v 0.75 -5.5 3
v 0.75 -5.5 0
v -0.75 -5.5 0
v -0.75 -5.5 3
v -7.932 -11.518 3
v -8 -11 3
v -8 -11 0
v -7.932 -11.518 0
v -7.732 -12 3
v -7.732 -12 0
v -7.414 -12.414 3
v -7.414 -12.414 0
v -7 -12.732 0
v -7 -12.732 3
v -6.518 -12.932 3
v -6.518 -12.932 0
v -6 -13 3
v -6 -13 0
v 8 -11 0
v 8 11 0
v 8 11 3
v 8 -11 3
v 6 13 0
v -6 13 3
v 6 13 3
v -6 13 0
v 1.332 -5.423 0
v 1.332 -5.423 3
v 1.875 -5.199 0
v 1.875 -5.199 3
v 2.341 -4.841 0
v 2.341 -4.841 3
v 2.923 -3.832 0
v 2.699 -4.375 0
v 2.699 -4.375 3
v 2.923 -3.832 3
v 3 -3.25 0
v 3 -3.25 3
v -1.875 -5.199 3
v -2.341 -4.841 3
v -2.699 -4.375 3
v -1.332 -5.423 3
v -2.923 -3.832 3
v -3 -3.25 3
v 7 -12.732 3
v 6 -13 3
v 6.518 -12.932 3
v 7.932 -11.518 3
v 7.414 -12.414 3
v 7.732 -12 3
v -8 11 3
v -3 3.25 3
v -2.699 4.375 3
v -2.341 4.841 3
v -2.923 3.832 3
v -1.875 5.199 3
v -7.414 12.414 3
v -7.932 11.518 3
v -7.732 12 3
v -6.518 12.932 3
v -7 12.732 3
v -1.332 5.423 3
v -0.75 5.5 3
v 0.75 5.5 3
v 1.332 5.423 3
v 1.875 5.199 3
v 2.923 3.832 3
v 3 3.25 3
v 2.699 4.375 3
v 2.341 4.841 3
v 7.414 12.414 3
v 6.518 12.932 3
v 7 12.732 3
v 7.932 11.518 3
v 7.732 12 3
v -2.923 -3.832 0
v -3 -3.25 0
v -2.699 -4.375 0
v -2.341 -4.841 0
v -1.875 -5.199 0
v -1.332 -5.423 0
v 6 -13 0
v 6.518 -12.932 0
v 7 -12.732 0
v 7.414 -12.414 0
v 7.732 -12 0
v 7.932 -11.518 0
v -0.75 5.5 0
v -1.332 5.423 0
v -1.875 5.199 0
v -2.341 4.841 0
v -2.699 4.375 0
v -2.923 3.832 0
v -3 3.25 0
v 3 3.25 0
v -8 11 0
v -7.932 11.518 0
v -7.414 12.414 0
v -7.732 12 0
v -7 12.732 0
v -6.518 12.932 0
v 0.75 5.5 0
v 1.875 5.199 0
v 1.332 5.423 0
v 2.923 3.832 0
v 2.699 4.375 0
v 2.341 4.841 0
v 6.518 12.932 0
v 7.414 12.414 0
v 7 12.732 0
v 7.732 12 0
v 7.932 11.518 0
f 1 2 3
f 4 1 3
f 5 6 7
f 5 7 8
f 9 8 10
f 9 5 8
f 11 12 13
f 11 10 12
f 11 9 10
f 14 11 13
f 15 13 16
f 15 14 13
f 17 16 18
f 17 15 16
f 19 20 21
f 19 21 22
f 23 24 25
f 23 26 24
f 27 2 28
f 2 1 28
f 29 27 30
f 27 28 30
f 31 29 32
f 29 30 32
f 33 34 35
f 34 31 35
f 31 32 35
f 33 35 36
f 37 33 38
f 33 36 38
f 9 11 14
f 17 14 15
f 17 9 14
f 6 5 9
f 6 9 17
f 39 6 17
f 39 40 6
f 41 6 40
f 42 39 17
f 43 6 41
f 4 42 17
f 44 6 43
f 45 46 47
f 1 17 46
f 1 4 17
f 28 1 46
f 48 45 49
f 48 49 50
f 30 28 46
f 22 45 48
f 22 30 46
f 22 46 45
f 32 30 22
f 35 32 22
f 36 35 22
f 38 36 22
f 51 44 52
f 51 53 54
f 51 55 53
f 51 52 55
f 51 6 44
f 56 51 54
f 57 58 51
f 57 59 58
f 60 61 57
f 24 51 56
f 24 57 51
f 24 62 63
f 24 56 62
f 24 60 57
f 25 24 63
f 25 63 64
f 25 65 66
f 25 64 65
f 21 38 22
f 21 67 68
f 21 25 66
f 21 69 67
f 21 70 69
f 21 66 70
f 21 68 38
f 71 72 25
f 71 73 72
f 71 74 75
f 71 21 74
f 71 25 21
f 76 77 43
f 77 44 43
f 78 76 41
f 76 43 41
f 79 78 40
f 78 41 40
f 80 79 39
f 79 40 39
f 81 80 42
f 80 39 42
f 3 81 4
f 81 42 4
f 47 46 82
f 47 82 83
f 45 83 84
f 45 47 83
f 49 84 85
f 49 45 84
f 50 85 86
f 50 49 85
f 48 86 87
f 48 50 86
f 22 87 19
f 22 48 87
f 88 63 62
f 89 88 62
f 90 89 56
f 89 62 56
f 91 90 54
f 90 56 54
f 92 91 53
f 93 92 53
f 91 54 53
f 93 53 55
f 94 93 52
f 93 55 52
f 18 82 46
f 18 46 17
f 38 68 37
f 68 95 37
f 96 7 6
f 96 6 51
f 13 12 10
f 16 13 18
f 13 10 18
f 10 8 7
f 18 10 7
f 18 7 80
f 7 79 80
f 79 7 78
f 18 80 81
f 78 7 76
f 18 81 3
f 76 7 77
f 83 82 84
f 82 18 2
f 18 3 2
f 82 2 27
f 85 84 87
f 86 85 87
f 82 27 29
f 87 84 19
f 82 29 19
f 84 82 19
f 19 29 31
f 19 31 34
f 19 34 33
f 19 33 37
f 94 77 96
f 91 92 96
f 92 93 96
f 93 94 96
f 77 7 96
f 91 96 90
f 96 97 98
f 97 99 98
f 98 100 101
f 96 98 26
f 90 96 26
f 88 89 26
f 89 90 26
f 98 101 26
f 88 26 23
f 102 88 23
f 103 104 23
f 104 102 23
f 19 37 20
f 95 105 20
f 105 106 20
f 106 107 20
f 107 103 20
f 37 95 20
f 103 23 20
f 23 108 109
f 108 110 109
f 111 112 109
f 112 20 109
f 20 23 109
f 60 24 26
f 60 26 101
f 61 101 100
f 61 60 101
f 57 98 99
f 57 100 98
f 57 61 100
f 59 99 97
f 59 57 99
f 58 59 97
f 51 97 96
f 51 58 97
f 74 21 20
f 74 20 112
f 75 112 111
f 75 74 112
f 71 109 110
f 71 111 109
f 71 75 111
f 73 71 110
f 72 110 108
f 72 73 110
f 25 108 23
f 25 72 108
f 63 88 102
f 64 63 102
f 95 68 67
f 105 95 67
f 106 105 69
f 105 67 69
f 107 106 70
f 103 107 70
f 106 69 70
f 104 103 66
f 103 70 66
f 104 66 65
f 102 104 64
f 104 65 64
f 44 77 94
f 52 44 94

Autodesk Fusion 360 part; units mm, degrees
sketch "Sketch2" plane through (0, 0, 0) normal (0, 0, 1) x (1, 0, 0)
  line L0 (8, -13) -> (-8, -13)
  line L1 (-8, -13) -> (-8, 13)
  line L2 (-8, 13) -> (8, 13)
  line L3 (8, 13) -> (8, -13)
  line L4 (8, -13) -> (-8, 13) construction
  line L5 (-8, -13) -> (8, 13) construction
  line L6 (3, -5.5) -> (-3, -5.5)
  line L7 (-3, -5.5) -> (-3, 5.5)
  line L8 (-3, 5.5) -> (3, 5.5)
  line L9 (3, 5.5) -> (3, -5.5)
  line L10 (3, -5.5) -> (-3, 5.5) construction
  line L11 (-3, -5.5) -> (3, 5.5) construction
  dimension "d23" = 16
  dimension "d24" = 26
  dimension "d25" = 6
  dimension "d26" = 11
extrude "Extrude2" add sketch "Sketch2" along normal blind 3
fillet "Fillet6" radius 2 4 edges at (8, 13, 1.5) (-8, 13, 1.5) (-8, -13, 1.5) (8, -13, 1.5)
fillet "Fillet7" radius 2.25 4 edges at (-3, 5.5, 1.5) (3, 5.5, 1.5) (3, -5.5, 1.5) (-3, -5.5, 1.5)
extrude "Extrude1" [suppressed]
fillet "Fillet1" [suppressed]
fillet "Fillet2" [suppressed]
fillet "Fillet3" [suppressed]
fillet "Fillet4" [suppressed]
fillet "Fillet5" [suppressed]
